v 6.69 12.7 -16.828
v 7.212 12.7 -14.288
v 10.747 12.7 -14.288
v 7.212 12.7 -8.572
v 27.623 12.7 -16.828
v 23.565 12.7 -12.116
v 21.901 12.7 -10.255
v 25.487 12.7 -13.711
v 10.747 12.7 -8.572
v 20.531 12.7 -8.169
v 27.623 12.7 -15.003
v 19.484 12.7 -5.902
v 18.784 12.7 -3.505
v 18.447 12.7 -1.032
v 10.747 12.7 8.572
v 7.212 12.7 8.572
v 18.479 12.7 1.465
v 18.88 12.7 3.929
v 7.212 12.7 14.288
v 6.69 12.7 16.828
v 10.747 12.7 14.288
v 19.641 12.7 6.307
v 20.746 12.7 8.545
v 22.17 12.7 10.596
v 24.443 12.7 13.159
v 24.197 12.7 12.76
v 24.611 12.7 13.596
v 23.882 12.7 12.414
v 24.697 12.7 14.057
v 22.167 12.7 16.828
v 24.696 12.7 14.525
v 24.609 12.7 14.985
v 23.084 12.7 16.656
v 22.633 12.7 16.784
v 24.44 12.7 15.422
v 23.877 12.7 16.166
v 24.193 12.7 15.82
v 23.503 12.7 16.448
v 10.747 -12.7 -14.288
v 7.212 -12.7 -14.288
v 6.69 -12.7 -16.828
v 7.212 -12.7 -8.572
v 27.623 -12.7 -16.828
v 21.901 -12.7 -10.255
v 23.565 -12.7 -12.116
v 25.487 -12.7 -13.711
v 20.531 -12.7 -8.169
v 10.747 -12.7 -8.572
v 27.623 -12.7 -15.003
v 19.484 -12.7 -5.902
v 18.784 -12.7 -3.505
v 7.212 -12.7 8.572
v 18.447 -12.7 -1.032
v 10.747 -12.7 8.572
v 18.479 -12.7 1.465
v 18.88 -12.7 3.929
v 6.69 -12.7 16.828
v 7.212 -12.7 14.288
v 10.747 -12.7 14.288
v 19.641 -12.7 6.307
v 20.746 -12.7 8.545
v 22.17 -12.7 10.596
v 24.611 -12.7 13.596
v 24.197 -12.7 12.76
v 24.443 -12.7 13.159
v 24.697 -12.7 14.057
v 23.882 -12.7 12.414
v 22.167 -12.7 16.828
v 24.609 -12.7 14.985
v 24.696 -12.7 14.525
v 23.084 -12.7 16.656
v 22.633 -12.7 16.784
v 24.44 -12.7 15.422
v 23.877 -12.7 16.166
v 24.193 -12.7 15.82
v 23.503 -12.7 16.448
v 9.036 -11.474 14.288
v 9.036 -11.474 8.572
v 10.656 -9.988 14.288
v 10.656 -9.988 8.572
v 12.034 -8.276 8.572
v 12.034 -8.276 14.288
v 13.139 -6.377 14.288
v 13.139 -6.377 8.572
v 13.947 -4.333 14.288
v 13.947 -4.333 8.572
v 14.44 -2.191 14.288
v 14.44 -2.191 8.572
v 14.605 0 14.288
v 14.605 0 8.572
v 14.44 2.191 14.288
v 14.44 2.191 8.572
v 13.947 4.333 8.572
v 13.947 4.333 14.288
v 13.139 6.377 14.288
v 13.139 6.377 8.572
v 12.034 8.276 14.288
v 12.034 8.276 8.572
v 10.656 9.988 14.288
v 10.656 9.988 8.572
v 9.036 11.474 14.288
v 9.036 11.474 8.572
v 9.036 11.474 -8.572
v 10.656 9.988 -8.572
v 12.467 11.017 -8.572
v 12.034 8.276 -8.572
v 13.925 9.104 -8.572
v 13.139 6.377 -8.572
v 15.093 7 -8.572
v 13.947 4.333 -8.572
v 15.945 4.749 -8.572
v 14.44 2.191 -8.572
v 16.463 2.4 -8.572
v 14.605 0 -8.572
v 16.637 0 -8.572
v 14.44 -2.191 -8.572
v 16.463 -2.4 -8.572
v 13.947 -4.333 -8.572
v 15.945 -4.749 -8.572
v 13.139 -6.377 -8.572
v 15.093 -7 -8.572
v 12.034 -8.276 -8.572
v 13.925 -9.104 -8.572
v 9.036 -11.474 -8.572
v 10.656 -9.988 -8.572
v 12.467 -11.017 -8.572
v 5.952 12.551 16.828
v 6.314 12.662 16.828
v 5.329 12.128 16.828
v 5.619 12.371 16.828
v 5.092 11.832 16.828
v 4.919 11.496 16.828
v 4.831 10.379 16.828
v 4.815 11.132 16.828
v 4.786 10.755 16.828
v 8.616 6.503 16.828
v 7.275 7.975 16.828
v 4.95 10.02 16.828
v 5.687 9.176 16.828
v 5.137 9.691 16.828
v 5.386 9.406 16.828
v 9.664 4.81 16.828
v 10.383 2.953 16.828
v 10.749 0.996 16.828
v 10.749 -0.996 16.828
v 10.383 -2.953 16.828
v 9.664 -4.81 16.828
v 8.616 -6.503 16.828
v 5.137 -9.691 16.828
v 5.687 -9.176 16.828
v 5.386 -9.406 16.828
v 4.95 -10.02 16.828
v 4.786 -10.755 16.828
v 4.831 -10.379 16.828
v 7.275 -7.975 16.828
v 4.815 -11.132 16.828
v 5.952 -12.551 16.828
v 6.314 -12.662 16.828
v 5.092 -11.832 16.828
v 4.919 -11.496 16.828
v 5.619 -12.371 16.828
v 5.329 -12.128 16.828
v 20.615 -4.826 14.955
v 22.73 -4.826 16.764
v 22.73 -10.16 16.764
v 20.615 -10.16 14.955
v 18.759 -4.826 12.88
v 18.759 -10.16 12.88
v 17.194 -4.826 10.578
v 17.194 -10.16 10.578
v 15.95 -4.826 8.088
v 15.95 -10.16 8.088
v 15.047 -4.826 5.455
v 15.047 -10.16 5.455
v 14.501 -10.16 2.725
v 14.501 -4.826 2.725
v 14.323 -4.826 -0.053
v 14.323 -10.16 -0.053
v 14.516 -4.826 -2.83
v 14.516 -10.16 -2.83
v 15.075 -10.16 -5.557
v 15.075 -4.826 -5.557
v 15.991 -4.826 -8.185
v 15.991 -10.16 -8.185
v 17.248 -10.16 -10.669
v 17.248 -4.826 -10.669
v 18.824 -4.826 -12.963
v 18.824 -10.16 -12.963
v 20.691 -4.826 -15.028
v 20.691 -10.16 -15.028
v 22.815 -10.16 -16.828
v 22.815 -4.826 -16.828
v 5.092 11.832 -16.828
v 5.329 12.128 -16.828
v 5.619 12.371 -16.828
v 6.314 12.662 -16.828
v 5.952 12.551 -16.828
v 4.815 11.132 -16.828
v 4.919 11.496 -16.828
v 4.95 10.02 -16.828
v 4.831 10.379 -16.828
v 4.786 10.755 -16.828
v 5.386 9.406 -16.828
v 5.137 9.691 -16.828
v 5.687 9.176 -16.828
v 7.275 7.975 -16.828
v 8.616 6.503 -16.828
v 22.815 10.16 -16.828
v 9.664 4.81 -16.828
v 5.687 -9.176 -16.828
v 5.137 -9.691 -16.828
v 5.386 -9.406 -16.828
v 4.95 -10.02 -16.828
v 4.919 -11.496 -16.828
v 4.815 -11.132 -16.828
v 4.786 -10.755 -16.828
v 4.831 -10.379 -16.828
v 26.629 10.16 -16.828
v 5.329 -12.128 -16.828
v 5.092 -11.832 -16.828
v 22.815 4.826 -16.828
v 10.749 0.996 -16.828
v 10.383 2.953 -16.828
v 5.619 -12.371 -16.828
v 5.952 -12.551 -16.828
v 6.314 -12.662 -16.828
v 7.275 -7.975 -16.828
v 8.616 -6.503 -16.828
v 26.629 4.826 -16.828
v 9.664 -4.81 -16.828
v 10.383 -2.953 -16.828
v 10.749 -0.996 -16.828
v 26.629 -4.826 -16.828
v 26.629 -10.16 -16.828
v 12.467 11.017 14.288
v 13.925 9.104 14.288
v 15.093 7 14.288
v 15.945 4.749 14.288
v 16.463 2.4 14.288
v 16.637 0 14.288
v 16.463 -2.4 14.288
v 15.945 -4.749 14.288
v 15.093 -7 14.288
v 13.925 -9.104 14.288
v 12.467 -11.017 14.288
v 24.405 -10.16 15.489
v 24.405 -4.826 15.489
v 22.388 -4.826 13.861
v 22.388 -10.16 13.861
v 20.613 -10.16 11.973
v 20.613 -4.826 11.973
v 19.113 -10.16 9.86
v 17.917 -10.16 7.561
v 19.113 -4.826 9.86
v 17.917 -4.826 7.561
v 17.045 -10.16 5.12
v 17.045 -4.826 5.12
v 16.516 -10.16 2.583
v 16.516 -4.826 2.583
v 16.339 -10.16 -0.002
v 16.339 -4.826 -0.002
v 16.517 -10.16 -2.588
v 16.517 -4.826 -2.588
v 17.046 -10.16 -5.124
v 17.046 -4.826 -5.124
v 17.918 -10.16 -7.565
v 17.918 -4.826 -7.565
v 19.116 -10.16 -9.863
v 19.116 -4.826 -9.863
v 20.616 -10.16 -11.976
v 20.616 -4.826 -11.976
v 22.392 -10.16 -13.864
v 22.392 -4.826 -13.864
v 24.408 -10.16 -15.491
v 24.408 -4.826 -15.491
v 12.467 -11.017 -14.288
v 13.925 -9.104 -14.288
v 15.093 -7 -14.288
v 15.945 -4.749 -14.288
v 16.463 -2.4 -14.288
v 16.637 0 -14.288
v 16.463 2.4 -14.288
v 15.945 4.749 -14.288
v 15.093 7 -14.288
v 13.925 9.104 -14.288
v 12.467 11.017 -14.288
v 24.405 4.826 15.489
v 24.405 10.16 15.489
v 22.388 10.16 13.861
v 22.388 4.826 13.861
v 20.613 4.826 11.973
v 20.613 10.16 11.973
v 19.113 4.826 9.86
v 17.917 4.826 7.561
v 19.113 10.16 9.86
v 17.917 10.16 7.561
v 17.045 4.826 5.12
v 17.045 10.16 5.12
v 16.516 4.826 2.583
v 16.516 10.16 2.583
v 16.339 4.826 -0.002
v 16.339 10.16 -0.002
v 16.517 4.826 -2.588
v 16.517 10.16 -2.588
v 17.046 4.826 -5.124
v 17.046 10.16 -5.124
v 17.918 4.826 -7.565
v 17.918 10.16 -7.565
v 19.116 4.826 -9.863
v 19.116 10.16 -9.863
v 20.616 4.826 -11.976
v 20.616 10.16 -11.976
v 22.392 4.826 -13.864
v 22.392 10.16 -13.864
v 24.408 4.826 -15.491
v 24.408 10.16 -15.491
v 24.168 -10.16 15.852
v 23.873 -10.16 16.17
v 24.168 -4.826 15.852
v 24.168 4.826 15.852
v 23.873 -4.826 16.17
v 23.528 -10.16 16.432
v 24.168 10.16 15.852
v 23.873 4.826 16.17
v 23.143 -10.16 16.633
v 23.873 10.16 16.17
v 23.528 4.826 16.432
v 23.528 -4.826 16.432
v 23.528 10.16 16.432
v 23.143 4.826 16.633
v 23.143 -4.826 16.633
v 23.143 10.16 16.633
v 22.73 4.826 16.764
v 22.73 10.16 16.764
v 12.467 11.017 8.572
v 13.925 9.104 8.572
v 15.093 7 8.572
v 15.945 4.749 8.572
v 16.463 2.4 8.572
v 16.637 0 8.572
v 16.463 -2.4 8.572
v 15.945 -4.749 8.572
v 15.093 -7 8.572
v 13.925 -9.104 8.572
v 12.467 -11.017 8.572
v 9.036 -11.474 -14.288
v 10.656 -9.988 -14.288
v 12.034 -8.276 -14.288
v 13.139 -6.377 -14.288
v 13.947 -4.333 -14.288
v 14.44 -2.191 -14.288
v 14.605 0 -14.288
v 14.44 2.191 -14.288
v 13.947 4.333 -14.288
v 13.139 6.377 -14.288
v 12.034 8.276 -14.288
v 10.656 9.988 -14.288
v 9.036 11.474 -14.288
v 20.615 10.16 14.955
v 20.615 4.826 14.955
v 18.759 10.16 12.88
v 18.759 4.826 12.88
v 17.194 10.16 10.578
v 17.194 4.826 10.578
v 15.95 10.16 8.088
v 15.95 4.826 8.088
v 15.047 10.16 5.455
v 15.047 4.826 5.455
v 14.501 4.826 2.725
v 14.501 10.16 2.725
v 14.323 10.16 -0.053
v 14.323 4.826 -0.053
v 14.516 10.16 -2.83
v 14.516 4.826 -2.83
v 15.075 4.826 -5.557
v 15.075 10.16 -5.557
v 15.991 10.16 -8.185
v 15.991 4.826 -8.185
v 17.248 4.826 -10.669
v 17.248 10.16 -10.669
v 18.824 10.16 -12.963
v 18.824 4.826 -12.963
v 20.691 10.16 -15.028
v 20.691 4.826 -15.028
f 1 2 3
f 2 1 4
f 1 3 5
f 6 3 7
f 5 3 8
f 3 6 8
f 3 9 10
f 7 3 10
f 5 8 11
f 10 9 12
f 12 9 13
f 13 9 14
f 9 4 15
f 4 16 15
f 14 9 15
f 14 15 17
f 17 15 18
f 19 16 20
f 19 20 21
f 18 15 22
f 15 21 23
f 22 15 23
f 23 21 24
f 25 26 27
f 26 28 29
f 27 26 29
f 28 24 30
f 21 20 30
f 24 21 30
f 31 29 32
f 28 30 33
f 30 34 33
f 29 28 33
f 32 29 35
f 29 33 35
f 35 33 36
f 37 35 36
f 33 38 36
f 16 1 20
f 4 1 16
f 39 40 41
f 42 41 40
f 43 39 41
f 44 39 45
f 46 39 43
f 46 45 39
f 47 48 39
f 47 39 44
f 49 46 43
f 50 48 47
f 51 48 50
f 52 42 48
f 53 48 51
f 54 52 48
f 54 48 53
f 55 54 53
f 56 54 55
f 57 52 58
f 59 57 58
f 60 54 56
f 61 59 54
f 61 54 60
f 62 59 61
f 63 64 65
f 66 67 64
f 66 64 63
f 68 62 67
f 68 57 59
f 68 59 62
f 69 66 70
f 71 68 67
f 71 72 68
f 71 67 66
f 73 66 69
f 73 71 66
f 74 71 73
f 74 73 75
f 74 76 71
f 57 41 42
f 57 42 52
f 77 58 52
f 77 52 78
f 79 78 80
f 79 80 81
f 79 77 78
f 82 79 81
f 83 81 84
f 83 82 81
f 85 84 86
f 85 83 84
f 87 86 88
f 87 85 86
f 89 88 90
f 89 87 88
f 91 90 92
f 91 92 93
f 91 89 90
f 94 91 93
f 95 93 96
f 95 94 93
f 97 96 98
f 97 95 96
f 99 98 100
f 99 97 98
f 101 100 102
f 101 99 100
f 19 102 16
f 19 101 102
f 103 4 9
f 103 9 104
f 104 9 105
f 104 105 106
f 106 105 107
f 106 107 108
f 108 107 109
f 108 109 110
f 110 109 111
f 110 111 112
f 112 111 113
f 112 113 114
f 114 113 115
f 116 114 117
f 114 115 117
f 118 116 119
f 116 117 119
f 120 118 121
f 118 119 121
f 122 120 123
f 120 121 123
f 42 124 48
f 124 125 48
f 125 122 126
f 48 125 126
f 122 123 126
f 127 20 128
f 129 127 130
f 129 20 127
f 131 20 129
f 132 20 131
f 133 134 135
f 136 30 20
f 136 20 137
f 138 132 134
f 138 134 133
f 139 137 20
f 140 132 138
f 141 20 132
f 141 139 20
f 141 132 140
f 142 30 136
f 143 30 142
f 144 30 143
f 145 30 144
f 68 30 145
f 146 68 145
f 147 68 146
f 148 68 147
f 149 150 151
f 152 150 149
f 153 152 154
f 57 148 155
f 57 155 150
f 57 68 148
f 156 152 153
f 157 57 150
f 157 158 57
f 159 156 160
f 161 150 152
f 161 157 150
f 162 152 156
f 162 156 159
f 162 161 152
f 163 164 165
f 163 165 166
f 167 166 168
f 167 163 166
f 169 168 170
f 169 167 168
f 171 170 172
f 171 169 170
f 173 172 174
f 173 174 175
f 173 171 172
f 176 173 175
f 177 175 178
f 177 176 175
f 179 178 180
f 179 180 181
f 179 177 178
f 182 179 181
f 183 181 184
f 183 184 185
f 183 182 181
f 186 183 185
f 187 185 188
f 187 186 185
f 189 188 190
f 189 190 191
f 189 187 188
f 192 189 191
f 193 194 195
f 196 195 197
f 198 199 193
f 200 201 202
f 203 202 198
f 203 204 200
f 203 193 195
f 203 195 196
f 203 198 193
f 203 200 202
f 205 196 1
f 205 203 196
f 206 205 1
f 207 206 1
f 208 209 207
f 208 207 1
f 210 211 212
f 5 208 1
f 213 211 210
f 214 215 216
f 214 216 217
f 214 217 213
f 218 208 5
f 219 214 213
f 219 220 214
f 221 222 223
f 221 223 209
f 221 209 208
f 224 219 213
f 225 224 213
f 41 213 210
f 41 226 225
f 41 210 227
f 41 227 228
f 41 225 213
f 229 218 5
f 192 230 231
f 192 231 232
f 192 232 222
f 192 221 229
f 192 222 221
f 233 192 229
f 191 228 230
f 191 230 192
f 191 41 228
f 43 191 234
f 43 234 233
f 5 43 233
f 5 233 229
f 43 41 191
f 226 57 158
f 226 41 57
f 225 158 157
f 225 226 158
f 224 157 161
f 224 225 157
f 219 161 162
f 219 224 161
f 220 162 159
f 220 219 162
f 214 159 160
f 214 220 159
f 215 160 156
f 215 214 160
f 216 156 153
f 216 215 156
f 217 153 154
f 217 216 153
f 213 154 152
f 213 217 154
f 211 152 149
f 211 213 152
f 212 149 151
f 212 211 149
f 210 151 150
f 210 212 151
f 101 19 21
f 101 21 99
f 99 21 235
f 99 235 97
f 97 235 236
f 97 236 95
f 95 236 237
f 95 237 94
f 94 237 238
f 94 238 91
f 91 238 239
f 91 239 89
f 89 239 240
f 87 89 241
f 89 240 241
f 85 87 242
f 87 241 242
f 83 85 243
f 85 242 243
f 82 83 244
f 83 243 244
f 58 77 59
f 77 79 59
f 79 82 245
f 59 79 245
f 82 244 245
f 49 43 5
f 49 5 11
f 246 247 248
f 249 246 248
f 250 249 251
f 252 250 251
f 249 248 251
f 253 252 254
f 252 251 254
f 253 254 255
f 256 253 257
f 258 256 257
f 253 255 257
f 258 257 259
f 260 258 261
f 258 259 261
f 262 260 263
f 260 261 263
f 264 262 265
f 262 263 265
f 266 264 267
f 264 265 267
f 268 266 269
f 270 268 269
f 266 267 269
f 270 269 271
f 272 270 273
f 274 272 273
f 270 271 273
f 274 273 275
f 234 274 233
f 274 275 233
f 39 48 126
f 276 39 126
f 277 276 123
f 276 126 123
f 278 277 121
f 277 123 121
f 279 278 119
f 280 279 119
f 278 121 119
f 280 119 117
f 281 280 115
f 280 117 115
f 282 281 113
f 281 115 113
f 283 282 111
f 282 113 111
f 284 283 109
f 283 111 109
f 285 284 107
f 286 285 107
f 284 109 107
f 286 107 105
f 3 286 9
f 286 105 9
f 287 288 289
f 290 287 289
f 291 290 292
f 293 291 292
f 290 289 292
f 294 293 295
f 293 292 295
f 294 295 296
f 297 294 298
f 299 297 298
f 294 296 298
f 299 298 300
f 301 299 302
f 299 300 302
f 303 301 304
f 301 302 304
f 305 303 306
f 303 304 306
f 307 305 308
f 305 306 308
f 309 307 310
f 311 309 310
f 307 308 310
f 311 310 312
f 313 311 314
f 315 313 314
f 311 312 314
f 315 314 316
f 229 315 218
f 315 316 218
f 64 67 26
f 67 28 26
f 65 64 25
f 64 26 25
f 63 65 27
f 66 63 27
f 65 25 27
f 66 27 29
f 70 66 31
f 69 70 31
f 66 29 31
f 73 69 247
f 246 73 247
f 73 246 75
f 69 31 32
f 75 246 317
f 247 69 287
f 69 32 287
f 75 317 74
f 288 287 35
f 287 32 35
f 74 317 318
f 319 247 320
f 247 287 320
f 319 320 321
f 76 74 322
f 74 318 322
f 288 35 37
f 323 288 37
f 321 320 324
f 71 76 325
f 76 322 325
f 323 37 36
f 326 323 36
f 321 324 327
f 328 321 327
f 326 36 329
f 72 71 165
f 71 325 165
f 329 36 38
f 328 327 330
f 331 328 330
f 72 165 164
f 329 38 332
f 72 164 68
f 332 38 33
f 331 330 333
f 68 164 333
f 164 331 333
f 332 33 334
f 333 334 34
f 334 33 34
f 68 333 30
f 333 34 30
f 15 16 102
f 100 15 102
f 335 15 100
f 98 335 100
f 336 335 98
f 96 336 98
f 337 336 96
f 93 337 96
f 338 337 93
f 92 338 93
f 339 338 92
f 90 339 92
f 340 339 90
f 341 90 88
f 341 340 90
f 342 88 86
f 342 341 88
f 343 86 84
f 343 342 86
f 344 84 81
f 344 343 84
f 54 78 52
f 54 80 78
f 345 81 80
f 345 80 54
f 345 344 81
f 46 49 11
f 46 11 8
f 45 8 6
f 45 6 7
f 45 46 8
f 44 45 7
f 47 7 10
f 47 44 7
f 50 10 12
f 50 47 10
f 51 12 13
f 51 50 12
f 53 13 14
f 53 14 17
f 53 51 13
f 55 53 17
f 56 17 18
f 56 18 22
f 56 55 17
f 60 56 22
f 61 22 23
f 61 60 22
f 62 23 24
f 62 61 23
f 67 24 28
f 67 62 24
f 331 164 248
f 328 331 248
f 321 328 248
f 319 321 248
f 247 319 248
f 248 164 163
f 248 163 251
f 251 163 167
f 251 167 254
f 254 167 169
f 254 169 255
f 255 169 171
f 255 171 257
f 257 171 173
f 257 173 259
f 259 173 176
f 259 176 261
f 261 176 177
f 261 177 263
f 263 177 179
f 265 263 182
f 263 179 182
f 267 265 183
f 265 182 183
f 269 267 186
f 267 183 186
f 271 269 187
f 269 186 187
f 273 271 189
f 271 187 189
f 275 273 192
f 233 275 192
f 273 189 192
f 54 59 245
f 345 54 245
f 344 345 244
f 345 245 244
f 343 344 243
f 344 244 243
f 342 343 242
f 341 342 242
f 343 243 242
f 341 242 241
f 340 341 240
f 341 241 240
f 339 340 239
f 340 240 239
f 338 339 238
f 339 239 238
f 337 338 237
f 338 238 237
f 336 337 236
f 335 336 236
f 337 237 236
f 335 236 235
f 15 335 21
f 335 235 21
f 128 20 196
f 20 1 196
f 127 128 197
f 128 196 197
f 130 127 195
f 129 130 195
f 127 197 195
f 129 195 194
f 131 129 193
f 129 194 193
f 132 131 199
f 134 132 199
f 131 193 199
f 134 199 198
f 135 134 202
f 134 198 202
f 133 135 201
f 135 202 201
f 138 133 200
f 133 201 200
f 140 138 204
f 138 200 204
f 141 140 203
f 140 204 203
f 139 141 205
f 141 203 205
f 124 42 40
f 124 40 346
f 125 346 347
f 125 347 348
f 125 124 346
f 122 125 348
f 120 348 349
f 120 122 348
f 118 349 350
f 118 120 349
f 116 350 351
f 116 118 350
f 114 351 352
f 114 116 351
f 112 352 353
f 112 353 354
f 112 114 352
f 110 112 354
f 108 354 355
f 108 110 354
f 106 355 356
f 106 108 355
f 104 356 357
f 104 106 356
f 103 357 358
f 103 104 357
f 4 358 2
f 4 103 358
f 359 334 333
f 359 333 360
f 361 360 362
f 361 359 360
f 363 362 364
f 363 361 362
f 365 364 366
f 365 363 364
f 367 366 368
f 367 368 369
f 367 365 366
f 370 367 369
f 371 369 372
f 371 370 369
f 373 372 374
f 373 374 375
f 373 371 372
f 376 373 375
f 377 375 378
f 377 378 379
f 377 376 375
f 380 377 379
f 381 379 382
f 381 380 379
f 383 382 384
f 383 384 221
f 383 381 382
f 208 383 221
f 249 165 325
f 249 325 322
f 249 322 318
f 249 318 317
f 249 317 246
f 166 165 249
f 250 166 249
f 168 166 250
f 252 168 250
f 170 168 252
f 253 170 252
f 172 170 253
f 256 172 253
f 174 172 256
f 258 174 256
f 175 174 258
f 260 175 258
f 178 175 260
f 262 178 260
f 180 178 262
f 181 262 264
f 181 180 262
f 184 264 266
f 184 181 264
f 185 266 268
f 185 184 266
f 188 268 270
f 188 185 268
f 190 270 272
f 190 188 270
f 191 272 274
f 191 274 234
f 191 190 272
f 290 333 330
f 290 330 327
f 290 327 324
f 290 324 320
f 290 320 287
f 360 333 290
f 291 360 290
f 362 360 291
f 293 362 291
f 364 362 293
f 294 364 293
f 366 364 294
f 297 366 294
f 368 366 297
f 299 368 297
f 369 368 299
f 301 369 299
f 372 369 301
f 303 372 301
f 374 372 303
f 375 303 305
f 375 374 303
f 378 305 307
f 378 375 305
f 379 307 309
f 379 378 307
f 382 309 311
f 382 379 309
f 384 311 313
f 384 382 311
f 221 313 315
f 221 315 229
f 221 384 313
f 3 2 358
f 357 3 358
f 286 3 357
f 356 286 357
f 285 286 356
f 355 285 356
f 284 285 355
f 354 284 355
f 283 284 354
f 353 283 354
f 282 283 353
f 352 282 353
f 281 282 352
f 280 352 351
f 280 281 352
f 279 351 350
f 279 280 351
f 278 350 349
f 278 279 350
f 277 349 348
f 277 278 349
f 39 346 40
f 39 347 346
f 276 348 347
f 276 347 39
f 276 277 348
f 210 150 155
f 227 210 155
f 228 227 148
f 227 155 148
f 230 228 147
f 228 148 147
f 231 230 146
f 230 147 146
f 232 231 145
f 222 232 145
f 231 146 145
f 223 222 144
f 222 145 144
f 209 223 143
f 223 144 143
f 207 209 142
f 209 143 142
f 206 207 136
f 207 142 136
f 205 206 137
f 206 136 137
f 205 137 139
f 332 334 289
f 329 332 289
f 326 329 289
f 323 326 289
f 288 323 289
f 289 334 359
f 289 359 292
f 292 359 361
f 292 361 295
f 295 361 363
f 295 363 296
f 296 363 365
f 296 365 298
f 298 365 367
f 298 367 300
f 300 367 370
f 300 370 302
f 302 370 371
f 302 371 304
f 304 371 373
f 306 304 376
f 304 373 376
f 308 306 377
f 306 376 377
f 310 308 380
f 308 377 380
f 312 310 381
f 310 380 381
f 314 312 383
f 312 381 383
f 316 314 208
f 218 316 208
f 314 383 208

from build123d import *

# Parameters (mm, degrees)
F1_DEPTH      = 12.7
F4_DEPTH      = 16.8285
F4_DEPTH_BACK = 16.8285
F5_R          = 2.54
F6_W          = 5.334
F6_H          = 2.032
F8_W          = 7.62
F8_H          = 2.54
F9_DEPTH      = 12.701
F9_DEPTH_BACK = 12.701
F10_W         = 2.032
F10_H         = 5.715
F13_DEPTH     = 33.656
F14_R         = 1.90499


# Not quite as in the source:
# - a fillet or chamfer is up to 0.001 mm smaller than in the source, because OpenCascade refuses the exact size


with BuildPart() as f1:
    # F0 (on Front) → F1 (new body, symmetric)
    with BuildSketch(Plane.XZ):
        with BuildLine():
            Line((0, 16.8275), (0, -16.8275))
            Line((0, -16.8275), (35.2425, -16.8275))
            ThreePointArc((35.2425, -16.8275), (18.415, 0), (35.2425, 16.8275))
            Line((35.2425, 16.8275), (0, 16.8275))
        make_face()
    extrude(amount=F1_DEPTH, both=True)

    # F3 (on Top) → F4 (cut, two sides)
    with BuildSketch(Plane.XY) as f4_sk:
        with BuildLine():
            Line((0, 10.795), (0, -10.795))
            ThreePointArc((0, -10.795), (10.795, 0), (0, 10.795))
        make_face()
    extrude(amount=-F4_DEPTH, mode=Mode.SUBTRACT)
    extrude(f4_sk.sketch, amount=F4_DEPTH_BACK, mode=Mode.SUBTRACT)

    # F5
    f5_edges = [f1.edges().sort_by_distance(p)[0] for p in [
        (35.2425, 0, 16.8275),
    ]]
    fillet(f5_edges, radius=F5_R)

    # F6 (on offset) → F7 (revolve, cut)
    with BuildSketch(Plane.YZ.offset(32.7025)):
        with Locations((7.493, 19.7485)):
            Rectangle(F6_W, F6_H)
        with Locations((-7.493, 19.7485)):
            Rectangle(F6_W, F6_H)
    revolve(axis=Axis((35.2425, 0, 0), (0, -1, 0)), mode=Mode.SUBTRACT)

    # F8 (on Front) → F9 (cut, two sides)
    with BuildSketch(Plane.XZ) as f9_sk:
        with Locations((31.4325, -15.5575)):
            Rectangle(F8_W, F8_H)
    extrude(amount=F9_DEPTH, mode=Mode.SUBTRACT)
    extrude(f9_sk.sketch, amount=-F9_DEPTH_BACK, mode=Mode.SUBTRACT)

    # F10 (on Right) → F11 (revolve, cut)
    with BuildSketch(Plane.YZ):
        with Locations((-15.621, 11.43)):
            Rectangle(F10_W, F10_H)
        with Locations((-15.621, -11.43)):
            Rectangle(F10_W, F10_H)
    revolve(axis=Axis((0, 0, 0), (0, 0, 1)), mode=Mode.SUBTRACT)

    # F12 (on face) → F13 (cut, through all)
    with BuildSketch(Plane.XY.offset(16.8275)):
        Polygon((5.6866191131, 9.17575), (0, 12.7), (0, 9.17575), align=None)
        Polygon((5.6866191131, -9.17575), (0, -9.17575), (0, -12.7), align=None)
    extrude(amount=-F13_DEPTH, mode=Mode.SUBTRACT)

    # F14 (radius 1.905 in the source; OpenCascade refuses exactly that, so slightly less here)
    f14_edges = [f1.edges().sort_by_distance(p)[0] for p in [
        (0, 12.7, 0),
        (0, -12.7, 0),
    ]]
    fillet(f14_edges, radius=F14_R)


solid = f1.part
